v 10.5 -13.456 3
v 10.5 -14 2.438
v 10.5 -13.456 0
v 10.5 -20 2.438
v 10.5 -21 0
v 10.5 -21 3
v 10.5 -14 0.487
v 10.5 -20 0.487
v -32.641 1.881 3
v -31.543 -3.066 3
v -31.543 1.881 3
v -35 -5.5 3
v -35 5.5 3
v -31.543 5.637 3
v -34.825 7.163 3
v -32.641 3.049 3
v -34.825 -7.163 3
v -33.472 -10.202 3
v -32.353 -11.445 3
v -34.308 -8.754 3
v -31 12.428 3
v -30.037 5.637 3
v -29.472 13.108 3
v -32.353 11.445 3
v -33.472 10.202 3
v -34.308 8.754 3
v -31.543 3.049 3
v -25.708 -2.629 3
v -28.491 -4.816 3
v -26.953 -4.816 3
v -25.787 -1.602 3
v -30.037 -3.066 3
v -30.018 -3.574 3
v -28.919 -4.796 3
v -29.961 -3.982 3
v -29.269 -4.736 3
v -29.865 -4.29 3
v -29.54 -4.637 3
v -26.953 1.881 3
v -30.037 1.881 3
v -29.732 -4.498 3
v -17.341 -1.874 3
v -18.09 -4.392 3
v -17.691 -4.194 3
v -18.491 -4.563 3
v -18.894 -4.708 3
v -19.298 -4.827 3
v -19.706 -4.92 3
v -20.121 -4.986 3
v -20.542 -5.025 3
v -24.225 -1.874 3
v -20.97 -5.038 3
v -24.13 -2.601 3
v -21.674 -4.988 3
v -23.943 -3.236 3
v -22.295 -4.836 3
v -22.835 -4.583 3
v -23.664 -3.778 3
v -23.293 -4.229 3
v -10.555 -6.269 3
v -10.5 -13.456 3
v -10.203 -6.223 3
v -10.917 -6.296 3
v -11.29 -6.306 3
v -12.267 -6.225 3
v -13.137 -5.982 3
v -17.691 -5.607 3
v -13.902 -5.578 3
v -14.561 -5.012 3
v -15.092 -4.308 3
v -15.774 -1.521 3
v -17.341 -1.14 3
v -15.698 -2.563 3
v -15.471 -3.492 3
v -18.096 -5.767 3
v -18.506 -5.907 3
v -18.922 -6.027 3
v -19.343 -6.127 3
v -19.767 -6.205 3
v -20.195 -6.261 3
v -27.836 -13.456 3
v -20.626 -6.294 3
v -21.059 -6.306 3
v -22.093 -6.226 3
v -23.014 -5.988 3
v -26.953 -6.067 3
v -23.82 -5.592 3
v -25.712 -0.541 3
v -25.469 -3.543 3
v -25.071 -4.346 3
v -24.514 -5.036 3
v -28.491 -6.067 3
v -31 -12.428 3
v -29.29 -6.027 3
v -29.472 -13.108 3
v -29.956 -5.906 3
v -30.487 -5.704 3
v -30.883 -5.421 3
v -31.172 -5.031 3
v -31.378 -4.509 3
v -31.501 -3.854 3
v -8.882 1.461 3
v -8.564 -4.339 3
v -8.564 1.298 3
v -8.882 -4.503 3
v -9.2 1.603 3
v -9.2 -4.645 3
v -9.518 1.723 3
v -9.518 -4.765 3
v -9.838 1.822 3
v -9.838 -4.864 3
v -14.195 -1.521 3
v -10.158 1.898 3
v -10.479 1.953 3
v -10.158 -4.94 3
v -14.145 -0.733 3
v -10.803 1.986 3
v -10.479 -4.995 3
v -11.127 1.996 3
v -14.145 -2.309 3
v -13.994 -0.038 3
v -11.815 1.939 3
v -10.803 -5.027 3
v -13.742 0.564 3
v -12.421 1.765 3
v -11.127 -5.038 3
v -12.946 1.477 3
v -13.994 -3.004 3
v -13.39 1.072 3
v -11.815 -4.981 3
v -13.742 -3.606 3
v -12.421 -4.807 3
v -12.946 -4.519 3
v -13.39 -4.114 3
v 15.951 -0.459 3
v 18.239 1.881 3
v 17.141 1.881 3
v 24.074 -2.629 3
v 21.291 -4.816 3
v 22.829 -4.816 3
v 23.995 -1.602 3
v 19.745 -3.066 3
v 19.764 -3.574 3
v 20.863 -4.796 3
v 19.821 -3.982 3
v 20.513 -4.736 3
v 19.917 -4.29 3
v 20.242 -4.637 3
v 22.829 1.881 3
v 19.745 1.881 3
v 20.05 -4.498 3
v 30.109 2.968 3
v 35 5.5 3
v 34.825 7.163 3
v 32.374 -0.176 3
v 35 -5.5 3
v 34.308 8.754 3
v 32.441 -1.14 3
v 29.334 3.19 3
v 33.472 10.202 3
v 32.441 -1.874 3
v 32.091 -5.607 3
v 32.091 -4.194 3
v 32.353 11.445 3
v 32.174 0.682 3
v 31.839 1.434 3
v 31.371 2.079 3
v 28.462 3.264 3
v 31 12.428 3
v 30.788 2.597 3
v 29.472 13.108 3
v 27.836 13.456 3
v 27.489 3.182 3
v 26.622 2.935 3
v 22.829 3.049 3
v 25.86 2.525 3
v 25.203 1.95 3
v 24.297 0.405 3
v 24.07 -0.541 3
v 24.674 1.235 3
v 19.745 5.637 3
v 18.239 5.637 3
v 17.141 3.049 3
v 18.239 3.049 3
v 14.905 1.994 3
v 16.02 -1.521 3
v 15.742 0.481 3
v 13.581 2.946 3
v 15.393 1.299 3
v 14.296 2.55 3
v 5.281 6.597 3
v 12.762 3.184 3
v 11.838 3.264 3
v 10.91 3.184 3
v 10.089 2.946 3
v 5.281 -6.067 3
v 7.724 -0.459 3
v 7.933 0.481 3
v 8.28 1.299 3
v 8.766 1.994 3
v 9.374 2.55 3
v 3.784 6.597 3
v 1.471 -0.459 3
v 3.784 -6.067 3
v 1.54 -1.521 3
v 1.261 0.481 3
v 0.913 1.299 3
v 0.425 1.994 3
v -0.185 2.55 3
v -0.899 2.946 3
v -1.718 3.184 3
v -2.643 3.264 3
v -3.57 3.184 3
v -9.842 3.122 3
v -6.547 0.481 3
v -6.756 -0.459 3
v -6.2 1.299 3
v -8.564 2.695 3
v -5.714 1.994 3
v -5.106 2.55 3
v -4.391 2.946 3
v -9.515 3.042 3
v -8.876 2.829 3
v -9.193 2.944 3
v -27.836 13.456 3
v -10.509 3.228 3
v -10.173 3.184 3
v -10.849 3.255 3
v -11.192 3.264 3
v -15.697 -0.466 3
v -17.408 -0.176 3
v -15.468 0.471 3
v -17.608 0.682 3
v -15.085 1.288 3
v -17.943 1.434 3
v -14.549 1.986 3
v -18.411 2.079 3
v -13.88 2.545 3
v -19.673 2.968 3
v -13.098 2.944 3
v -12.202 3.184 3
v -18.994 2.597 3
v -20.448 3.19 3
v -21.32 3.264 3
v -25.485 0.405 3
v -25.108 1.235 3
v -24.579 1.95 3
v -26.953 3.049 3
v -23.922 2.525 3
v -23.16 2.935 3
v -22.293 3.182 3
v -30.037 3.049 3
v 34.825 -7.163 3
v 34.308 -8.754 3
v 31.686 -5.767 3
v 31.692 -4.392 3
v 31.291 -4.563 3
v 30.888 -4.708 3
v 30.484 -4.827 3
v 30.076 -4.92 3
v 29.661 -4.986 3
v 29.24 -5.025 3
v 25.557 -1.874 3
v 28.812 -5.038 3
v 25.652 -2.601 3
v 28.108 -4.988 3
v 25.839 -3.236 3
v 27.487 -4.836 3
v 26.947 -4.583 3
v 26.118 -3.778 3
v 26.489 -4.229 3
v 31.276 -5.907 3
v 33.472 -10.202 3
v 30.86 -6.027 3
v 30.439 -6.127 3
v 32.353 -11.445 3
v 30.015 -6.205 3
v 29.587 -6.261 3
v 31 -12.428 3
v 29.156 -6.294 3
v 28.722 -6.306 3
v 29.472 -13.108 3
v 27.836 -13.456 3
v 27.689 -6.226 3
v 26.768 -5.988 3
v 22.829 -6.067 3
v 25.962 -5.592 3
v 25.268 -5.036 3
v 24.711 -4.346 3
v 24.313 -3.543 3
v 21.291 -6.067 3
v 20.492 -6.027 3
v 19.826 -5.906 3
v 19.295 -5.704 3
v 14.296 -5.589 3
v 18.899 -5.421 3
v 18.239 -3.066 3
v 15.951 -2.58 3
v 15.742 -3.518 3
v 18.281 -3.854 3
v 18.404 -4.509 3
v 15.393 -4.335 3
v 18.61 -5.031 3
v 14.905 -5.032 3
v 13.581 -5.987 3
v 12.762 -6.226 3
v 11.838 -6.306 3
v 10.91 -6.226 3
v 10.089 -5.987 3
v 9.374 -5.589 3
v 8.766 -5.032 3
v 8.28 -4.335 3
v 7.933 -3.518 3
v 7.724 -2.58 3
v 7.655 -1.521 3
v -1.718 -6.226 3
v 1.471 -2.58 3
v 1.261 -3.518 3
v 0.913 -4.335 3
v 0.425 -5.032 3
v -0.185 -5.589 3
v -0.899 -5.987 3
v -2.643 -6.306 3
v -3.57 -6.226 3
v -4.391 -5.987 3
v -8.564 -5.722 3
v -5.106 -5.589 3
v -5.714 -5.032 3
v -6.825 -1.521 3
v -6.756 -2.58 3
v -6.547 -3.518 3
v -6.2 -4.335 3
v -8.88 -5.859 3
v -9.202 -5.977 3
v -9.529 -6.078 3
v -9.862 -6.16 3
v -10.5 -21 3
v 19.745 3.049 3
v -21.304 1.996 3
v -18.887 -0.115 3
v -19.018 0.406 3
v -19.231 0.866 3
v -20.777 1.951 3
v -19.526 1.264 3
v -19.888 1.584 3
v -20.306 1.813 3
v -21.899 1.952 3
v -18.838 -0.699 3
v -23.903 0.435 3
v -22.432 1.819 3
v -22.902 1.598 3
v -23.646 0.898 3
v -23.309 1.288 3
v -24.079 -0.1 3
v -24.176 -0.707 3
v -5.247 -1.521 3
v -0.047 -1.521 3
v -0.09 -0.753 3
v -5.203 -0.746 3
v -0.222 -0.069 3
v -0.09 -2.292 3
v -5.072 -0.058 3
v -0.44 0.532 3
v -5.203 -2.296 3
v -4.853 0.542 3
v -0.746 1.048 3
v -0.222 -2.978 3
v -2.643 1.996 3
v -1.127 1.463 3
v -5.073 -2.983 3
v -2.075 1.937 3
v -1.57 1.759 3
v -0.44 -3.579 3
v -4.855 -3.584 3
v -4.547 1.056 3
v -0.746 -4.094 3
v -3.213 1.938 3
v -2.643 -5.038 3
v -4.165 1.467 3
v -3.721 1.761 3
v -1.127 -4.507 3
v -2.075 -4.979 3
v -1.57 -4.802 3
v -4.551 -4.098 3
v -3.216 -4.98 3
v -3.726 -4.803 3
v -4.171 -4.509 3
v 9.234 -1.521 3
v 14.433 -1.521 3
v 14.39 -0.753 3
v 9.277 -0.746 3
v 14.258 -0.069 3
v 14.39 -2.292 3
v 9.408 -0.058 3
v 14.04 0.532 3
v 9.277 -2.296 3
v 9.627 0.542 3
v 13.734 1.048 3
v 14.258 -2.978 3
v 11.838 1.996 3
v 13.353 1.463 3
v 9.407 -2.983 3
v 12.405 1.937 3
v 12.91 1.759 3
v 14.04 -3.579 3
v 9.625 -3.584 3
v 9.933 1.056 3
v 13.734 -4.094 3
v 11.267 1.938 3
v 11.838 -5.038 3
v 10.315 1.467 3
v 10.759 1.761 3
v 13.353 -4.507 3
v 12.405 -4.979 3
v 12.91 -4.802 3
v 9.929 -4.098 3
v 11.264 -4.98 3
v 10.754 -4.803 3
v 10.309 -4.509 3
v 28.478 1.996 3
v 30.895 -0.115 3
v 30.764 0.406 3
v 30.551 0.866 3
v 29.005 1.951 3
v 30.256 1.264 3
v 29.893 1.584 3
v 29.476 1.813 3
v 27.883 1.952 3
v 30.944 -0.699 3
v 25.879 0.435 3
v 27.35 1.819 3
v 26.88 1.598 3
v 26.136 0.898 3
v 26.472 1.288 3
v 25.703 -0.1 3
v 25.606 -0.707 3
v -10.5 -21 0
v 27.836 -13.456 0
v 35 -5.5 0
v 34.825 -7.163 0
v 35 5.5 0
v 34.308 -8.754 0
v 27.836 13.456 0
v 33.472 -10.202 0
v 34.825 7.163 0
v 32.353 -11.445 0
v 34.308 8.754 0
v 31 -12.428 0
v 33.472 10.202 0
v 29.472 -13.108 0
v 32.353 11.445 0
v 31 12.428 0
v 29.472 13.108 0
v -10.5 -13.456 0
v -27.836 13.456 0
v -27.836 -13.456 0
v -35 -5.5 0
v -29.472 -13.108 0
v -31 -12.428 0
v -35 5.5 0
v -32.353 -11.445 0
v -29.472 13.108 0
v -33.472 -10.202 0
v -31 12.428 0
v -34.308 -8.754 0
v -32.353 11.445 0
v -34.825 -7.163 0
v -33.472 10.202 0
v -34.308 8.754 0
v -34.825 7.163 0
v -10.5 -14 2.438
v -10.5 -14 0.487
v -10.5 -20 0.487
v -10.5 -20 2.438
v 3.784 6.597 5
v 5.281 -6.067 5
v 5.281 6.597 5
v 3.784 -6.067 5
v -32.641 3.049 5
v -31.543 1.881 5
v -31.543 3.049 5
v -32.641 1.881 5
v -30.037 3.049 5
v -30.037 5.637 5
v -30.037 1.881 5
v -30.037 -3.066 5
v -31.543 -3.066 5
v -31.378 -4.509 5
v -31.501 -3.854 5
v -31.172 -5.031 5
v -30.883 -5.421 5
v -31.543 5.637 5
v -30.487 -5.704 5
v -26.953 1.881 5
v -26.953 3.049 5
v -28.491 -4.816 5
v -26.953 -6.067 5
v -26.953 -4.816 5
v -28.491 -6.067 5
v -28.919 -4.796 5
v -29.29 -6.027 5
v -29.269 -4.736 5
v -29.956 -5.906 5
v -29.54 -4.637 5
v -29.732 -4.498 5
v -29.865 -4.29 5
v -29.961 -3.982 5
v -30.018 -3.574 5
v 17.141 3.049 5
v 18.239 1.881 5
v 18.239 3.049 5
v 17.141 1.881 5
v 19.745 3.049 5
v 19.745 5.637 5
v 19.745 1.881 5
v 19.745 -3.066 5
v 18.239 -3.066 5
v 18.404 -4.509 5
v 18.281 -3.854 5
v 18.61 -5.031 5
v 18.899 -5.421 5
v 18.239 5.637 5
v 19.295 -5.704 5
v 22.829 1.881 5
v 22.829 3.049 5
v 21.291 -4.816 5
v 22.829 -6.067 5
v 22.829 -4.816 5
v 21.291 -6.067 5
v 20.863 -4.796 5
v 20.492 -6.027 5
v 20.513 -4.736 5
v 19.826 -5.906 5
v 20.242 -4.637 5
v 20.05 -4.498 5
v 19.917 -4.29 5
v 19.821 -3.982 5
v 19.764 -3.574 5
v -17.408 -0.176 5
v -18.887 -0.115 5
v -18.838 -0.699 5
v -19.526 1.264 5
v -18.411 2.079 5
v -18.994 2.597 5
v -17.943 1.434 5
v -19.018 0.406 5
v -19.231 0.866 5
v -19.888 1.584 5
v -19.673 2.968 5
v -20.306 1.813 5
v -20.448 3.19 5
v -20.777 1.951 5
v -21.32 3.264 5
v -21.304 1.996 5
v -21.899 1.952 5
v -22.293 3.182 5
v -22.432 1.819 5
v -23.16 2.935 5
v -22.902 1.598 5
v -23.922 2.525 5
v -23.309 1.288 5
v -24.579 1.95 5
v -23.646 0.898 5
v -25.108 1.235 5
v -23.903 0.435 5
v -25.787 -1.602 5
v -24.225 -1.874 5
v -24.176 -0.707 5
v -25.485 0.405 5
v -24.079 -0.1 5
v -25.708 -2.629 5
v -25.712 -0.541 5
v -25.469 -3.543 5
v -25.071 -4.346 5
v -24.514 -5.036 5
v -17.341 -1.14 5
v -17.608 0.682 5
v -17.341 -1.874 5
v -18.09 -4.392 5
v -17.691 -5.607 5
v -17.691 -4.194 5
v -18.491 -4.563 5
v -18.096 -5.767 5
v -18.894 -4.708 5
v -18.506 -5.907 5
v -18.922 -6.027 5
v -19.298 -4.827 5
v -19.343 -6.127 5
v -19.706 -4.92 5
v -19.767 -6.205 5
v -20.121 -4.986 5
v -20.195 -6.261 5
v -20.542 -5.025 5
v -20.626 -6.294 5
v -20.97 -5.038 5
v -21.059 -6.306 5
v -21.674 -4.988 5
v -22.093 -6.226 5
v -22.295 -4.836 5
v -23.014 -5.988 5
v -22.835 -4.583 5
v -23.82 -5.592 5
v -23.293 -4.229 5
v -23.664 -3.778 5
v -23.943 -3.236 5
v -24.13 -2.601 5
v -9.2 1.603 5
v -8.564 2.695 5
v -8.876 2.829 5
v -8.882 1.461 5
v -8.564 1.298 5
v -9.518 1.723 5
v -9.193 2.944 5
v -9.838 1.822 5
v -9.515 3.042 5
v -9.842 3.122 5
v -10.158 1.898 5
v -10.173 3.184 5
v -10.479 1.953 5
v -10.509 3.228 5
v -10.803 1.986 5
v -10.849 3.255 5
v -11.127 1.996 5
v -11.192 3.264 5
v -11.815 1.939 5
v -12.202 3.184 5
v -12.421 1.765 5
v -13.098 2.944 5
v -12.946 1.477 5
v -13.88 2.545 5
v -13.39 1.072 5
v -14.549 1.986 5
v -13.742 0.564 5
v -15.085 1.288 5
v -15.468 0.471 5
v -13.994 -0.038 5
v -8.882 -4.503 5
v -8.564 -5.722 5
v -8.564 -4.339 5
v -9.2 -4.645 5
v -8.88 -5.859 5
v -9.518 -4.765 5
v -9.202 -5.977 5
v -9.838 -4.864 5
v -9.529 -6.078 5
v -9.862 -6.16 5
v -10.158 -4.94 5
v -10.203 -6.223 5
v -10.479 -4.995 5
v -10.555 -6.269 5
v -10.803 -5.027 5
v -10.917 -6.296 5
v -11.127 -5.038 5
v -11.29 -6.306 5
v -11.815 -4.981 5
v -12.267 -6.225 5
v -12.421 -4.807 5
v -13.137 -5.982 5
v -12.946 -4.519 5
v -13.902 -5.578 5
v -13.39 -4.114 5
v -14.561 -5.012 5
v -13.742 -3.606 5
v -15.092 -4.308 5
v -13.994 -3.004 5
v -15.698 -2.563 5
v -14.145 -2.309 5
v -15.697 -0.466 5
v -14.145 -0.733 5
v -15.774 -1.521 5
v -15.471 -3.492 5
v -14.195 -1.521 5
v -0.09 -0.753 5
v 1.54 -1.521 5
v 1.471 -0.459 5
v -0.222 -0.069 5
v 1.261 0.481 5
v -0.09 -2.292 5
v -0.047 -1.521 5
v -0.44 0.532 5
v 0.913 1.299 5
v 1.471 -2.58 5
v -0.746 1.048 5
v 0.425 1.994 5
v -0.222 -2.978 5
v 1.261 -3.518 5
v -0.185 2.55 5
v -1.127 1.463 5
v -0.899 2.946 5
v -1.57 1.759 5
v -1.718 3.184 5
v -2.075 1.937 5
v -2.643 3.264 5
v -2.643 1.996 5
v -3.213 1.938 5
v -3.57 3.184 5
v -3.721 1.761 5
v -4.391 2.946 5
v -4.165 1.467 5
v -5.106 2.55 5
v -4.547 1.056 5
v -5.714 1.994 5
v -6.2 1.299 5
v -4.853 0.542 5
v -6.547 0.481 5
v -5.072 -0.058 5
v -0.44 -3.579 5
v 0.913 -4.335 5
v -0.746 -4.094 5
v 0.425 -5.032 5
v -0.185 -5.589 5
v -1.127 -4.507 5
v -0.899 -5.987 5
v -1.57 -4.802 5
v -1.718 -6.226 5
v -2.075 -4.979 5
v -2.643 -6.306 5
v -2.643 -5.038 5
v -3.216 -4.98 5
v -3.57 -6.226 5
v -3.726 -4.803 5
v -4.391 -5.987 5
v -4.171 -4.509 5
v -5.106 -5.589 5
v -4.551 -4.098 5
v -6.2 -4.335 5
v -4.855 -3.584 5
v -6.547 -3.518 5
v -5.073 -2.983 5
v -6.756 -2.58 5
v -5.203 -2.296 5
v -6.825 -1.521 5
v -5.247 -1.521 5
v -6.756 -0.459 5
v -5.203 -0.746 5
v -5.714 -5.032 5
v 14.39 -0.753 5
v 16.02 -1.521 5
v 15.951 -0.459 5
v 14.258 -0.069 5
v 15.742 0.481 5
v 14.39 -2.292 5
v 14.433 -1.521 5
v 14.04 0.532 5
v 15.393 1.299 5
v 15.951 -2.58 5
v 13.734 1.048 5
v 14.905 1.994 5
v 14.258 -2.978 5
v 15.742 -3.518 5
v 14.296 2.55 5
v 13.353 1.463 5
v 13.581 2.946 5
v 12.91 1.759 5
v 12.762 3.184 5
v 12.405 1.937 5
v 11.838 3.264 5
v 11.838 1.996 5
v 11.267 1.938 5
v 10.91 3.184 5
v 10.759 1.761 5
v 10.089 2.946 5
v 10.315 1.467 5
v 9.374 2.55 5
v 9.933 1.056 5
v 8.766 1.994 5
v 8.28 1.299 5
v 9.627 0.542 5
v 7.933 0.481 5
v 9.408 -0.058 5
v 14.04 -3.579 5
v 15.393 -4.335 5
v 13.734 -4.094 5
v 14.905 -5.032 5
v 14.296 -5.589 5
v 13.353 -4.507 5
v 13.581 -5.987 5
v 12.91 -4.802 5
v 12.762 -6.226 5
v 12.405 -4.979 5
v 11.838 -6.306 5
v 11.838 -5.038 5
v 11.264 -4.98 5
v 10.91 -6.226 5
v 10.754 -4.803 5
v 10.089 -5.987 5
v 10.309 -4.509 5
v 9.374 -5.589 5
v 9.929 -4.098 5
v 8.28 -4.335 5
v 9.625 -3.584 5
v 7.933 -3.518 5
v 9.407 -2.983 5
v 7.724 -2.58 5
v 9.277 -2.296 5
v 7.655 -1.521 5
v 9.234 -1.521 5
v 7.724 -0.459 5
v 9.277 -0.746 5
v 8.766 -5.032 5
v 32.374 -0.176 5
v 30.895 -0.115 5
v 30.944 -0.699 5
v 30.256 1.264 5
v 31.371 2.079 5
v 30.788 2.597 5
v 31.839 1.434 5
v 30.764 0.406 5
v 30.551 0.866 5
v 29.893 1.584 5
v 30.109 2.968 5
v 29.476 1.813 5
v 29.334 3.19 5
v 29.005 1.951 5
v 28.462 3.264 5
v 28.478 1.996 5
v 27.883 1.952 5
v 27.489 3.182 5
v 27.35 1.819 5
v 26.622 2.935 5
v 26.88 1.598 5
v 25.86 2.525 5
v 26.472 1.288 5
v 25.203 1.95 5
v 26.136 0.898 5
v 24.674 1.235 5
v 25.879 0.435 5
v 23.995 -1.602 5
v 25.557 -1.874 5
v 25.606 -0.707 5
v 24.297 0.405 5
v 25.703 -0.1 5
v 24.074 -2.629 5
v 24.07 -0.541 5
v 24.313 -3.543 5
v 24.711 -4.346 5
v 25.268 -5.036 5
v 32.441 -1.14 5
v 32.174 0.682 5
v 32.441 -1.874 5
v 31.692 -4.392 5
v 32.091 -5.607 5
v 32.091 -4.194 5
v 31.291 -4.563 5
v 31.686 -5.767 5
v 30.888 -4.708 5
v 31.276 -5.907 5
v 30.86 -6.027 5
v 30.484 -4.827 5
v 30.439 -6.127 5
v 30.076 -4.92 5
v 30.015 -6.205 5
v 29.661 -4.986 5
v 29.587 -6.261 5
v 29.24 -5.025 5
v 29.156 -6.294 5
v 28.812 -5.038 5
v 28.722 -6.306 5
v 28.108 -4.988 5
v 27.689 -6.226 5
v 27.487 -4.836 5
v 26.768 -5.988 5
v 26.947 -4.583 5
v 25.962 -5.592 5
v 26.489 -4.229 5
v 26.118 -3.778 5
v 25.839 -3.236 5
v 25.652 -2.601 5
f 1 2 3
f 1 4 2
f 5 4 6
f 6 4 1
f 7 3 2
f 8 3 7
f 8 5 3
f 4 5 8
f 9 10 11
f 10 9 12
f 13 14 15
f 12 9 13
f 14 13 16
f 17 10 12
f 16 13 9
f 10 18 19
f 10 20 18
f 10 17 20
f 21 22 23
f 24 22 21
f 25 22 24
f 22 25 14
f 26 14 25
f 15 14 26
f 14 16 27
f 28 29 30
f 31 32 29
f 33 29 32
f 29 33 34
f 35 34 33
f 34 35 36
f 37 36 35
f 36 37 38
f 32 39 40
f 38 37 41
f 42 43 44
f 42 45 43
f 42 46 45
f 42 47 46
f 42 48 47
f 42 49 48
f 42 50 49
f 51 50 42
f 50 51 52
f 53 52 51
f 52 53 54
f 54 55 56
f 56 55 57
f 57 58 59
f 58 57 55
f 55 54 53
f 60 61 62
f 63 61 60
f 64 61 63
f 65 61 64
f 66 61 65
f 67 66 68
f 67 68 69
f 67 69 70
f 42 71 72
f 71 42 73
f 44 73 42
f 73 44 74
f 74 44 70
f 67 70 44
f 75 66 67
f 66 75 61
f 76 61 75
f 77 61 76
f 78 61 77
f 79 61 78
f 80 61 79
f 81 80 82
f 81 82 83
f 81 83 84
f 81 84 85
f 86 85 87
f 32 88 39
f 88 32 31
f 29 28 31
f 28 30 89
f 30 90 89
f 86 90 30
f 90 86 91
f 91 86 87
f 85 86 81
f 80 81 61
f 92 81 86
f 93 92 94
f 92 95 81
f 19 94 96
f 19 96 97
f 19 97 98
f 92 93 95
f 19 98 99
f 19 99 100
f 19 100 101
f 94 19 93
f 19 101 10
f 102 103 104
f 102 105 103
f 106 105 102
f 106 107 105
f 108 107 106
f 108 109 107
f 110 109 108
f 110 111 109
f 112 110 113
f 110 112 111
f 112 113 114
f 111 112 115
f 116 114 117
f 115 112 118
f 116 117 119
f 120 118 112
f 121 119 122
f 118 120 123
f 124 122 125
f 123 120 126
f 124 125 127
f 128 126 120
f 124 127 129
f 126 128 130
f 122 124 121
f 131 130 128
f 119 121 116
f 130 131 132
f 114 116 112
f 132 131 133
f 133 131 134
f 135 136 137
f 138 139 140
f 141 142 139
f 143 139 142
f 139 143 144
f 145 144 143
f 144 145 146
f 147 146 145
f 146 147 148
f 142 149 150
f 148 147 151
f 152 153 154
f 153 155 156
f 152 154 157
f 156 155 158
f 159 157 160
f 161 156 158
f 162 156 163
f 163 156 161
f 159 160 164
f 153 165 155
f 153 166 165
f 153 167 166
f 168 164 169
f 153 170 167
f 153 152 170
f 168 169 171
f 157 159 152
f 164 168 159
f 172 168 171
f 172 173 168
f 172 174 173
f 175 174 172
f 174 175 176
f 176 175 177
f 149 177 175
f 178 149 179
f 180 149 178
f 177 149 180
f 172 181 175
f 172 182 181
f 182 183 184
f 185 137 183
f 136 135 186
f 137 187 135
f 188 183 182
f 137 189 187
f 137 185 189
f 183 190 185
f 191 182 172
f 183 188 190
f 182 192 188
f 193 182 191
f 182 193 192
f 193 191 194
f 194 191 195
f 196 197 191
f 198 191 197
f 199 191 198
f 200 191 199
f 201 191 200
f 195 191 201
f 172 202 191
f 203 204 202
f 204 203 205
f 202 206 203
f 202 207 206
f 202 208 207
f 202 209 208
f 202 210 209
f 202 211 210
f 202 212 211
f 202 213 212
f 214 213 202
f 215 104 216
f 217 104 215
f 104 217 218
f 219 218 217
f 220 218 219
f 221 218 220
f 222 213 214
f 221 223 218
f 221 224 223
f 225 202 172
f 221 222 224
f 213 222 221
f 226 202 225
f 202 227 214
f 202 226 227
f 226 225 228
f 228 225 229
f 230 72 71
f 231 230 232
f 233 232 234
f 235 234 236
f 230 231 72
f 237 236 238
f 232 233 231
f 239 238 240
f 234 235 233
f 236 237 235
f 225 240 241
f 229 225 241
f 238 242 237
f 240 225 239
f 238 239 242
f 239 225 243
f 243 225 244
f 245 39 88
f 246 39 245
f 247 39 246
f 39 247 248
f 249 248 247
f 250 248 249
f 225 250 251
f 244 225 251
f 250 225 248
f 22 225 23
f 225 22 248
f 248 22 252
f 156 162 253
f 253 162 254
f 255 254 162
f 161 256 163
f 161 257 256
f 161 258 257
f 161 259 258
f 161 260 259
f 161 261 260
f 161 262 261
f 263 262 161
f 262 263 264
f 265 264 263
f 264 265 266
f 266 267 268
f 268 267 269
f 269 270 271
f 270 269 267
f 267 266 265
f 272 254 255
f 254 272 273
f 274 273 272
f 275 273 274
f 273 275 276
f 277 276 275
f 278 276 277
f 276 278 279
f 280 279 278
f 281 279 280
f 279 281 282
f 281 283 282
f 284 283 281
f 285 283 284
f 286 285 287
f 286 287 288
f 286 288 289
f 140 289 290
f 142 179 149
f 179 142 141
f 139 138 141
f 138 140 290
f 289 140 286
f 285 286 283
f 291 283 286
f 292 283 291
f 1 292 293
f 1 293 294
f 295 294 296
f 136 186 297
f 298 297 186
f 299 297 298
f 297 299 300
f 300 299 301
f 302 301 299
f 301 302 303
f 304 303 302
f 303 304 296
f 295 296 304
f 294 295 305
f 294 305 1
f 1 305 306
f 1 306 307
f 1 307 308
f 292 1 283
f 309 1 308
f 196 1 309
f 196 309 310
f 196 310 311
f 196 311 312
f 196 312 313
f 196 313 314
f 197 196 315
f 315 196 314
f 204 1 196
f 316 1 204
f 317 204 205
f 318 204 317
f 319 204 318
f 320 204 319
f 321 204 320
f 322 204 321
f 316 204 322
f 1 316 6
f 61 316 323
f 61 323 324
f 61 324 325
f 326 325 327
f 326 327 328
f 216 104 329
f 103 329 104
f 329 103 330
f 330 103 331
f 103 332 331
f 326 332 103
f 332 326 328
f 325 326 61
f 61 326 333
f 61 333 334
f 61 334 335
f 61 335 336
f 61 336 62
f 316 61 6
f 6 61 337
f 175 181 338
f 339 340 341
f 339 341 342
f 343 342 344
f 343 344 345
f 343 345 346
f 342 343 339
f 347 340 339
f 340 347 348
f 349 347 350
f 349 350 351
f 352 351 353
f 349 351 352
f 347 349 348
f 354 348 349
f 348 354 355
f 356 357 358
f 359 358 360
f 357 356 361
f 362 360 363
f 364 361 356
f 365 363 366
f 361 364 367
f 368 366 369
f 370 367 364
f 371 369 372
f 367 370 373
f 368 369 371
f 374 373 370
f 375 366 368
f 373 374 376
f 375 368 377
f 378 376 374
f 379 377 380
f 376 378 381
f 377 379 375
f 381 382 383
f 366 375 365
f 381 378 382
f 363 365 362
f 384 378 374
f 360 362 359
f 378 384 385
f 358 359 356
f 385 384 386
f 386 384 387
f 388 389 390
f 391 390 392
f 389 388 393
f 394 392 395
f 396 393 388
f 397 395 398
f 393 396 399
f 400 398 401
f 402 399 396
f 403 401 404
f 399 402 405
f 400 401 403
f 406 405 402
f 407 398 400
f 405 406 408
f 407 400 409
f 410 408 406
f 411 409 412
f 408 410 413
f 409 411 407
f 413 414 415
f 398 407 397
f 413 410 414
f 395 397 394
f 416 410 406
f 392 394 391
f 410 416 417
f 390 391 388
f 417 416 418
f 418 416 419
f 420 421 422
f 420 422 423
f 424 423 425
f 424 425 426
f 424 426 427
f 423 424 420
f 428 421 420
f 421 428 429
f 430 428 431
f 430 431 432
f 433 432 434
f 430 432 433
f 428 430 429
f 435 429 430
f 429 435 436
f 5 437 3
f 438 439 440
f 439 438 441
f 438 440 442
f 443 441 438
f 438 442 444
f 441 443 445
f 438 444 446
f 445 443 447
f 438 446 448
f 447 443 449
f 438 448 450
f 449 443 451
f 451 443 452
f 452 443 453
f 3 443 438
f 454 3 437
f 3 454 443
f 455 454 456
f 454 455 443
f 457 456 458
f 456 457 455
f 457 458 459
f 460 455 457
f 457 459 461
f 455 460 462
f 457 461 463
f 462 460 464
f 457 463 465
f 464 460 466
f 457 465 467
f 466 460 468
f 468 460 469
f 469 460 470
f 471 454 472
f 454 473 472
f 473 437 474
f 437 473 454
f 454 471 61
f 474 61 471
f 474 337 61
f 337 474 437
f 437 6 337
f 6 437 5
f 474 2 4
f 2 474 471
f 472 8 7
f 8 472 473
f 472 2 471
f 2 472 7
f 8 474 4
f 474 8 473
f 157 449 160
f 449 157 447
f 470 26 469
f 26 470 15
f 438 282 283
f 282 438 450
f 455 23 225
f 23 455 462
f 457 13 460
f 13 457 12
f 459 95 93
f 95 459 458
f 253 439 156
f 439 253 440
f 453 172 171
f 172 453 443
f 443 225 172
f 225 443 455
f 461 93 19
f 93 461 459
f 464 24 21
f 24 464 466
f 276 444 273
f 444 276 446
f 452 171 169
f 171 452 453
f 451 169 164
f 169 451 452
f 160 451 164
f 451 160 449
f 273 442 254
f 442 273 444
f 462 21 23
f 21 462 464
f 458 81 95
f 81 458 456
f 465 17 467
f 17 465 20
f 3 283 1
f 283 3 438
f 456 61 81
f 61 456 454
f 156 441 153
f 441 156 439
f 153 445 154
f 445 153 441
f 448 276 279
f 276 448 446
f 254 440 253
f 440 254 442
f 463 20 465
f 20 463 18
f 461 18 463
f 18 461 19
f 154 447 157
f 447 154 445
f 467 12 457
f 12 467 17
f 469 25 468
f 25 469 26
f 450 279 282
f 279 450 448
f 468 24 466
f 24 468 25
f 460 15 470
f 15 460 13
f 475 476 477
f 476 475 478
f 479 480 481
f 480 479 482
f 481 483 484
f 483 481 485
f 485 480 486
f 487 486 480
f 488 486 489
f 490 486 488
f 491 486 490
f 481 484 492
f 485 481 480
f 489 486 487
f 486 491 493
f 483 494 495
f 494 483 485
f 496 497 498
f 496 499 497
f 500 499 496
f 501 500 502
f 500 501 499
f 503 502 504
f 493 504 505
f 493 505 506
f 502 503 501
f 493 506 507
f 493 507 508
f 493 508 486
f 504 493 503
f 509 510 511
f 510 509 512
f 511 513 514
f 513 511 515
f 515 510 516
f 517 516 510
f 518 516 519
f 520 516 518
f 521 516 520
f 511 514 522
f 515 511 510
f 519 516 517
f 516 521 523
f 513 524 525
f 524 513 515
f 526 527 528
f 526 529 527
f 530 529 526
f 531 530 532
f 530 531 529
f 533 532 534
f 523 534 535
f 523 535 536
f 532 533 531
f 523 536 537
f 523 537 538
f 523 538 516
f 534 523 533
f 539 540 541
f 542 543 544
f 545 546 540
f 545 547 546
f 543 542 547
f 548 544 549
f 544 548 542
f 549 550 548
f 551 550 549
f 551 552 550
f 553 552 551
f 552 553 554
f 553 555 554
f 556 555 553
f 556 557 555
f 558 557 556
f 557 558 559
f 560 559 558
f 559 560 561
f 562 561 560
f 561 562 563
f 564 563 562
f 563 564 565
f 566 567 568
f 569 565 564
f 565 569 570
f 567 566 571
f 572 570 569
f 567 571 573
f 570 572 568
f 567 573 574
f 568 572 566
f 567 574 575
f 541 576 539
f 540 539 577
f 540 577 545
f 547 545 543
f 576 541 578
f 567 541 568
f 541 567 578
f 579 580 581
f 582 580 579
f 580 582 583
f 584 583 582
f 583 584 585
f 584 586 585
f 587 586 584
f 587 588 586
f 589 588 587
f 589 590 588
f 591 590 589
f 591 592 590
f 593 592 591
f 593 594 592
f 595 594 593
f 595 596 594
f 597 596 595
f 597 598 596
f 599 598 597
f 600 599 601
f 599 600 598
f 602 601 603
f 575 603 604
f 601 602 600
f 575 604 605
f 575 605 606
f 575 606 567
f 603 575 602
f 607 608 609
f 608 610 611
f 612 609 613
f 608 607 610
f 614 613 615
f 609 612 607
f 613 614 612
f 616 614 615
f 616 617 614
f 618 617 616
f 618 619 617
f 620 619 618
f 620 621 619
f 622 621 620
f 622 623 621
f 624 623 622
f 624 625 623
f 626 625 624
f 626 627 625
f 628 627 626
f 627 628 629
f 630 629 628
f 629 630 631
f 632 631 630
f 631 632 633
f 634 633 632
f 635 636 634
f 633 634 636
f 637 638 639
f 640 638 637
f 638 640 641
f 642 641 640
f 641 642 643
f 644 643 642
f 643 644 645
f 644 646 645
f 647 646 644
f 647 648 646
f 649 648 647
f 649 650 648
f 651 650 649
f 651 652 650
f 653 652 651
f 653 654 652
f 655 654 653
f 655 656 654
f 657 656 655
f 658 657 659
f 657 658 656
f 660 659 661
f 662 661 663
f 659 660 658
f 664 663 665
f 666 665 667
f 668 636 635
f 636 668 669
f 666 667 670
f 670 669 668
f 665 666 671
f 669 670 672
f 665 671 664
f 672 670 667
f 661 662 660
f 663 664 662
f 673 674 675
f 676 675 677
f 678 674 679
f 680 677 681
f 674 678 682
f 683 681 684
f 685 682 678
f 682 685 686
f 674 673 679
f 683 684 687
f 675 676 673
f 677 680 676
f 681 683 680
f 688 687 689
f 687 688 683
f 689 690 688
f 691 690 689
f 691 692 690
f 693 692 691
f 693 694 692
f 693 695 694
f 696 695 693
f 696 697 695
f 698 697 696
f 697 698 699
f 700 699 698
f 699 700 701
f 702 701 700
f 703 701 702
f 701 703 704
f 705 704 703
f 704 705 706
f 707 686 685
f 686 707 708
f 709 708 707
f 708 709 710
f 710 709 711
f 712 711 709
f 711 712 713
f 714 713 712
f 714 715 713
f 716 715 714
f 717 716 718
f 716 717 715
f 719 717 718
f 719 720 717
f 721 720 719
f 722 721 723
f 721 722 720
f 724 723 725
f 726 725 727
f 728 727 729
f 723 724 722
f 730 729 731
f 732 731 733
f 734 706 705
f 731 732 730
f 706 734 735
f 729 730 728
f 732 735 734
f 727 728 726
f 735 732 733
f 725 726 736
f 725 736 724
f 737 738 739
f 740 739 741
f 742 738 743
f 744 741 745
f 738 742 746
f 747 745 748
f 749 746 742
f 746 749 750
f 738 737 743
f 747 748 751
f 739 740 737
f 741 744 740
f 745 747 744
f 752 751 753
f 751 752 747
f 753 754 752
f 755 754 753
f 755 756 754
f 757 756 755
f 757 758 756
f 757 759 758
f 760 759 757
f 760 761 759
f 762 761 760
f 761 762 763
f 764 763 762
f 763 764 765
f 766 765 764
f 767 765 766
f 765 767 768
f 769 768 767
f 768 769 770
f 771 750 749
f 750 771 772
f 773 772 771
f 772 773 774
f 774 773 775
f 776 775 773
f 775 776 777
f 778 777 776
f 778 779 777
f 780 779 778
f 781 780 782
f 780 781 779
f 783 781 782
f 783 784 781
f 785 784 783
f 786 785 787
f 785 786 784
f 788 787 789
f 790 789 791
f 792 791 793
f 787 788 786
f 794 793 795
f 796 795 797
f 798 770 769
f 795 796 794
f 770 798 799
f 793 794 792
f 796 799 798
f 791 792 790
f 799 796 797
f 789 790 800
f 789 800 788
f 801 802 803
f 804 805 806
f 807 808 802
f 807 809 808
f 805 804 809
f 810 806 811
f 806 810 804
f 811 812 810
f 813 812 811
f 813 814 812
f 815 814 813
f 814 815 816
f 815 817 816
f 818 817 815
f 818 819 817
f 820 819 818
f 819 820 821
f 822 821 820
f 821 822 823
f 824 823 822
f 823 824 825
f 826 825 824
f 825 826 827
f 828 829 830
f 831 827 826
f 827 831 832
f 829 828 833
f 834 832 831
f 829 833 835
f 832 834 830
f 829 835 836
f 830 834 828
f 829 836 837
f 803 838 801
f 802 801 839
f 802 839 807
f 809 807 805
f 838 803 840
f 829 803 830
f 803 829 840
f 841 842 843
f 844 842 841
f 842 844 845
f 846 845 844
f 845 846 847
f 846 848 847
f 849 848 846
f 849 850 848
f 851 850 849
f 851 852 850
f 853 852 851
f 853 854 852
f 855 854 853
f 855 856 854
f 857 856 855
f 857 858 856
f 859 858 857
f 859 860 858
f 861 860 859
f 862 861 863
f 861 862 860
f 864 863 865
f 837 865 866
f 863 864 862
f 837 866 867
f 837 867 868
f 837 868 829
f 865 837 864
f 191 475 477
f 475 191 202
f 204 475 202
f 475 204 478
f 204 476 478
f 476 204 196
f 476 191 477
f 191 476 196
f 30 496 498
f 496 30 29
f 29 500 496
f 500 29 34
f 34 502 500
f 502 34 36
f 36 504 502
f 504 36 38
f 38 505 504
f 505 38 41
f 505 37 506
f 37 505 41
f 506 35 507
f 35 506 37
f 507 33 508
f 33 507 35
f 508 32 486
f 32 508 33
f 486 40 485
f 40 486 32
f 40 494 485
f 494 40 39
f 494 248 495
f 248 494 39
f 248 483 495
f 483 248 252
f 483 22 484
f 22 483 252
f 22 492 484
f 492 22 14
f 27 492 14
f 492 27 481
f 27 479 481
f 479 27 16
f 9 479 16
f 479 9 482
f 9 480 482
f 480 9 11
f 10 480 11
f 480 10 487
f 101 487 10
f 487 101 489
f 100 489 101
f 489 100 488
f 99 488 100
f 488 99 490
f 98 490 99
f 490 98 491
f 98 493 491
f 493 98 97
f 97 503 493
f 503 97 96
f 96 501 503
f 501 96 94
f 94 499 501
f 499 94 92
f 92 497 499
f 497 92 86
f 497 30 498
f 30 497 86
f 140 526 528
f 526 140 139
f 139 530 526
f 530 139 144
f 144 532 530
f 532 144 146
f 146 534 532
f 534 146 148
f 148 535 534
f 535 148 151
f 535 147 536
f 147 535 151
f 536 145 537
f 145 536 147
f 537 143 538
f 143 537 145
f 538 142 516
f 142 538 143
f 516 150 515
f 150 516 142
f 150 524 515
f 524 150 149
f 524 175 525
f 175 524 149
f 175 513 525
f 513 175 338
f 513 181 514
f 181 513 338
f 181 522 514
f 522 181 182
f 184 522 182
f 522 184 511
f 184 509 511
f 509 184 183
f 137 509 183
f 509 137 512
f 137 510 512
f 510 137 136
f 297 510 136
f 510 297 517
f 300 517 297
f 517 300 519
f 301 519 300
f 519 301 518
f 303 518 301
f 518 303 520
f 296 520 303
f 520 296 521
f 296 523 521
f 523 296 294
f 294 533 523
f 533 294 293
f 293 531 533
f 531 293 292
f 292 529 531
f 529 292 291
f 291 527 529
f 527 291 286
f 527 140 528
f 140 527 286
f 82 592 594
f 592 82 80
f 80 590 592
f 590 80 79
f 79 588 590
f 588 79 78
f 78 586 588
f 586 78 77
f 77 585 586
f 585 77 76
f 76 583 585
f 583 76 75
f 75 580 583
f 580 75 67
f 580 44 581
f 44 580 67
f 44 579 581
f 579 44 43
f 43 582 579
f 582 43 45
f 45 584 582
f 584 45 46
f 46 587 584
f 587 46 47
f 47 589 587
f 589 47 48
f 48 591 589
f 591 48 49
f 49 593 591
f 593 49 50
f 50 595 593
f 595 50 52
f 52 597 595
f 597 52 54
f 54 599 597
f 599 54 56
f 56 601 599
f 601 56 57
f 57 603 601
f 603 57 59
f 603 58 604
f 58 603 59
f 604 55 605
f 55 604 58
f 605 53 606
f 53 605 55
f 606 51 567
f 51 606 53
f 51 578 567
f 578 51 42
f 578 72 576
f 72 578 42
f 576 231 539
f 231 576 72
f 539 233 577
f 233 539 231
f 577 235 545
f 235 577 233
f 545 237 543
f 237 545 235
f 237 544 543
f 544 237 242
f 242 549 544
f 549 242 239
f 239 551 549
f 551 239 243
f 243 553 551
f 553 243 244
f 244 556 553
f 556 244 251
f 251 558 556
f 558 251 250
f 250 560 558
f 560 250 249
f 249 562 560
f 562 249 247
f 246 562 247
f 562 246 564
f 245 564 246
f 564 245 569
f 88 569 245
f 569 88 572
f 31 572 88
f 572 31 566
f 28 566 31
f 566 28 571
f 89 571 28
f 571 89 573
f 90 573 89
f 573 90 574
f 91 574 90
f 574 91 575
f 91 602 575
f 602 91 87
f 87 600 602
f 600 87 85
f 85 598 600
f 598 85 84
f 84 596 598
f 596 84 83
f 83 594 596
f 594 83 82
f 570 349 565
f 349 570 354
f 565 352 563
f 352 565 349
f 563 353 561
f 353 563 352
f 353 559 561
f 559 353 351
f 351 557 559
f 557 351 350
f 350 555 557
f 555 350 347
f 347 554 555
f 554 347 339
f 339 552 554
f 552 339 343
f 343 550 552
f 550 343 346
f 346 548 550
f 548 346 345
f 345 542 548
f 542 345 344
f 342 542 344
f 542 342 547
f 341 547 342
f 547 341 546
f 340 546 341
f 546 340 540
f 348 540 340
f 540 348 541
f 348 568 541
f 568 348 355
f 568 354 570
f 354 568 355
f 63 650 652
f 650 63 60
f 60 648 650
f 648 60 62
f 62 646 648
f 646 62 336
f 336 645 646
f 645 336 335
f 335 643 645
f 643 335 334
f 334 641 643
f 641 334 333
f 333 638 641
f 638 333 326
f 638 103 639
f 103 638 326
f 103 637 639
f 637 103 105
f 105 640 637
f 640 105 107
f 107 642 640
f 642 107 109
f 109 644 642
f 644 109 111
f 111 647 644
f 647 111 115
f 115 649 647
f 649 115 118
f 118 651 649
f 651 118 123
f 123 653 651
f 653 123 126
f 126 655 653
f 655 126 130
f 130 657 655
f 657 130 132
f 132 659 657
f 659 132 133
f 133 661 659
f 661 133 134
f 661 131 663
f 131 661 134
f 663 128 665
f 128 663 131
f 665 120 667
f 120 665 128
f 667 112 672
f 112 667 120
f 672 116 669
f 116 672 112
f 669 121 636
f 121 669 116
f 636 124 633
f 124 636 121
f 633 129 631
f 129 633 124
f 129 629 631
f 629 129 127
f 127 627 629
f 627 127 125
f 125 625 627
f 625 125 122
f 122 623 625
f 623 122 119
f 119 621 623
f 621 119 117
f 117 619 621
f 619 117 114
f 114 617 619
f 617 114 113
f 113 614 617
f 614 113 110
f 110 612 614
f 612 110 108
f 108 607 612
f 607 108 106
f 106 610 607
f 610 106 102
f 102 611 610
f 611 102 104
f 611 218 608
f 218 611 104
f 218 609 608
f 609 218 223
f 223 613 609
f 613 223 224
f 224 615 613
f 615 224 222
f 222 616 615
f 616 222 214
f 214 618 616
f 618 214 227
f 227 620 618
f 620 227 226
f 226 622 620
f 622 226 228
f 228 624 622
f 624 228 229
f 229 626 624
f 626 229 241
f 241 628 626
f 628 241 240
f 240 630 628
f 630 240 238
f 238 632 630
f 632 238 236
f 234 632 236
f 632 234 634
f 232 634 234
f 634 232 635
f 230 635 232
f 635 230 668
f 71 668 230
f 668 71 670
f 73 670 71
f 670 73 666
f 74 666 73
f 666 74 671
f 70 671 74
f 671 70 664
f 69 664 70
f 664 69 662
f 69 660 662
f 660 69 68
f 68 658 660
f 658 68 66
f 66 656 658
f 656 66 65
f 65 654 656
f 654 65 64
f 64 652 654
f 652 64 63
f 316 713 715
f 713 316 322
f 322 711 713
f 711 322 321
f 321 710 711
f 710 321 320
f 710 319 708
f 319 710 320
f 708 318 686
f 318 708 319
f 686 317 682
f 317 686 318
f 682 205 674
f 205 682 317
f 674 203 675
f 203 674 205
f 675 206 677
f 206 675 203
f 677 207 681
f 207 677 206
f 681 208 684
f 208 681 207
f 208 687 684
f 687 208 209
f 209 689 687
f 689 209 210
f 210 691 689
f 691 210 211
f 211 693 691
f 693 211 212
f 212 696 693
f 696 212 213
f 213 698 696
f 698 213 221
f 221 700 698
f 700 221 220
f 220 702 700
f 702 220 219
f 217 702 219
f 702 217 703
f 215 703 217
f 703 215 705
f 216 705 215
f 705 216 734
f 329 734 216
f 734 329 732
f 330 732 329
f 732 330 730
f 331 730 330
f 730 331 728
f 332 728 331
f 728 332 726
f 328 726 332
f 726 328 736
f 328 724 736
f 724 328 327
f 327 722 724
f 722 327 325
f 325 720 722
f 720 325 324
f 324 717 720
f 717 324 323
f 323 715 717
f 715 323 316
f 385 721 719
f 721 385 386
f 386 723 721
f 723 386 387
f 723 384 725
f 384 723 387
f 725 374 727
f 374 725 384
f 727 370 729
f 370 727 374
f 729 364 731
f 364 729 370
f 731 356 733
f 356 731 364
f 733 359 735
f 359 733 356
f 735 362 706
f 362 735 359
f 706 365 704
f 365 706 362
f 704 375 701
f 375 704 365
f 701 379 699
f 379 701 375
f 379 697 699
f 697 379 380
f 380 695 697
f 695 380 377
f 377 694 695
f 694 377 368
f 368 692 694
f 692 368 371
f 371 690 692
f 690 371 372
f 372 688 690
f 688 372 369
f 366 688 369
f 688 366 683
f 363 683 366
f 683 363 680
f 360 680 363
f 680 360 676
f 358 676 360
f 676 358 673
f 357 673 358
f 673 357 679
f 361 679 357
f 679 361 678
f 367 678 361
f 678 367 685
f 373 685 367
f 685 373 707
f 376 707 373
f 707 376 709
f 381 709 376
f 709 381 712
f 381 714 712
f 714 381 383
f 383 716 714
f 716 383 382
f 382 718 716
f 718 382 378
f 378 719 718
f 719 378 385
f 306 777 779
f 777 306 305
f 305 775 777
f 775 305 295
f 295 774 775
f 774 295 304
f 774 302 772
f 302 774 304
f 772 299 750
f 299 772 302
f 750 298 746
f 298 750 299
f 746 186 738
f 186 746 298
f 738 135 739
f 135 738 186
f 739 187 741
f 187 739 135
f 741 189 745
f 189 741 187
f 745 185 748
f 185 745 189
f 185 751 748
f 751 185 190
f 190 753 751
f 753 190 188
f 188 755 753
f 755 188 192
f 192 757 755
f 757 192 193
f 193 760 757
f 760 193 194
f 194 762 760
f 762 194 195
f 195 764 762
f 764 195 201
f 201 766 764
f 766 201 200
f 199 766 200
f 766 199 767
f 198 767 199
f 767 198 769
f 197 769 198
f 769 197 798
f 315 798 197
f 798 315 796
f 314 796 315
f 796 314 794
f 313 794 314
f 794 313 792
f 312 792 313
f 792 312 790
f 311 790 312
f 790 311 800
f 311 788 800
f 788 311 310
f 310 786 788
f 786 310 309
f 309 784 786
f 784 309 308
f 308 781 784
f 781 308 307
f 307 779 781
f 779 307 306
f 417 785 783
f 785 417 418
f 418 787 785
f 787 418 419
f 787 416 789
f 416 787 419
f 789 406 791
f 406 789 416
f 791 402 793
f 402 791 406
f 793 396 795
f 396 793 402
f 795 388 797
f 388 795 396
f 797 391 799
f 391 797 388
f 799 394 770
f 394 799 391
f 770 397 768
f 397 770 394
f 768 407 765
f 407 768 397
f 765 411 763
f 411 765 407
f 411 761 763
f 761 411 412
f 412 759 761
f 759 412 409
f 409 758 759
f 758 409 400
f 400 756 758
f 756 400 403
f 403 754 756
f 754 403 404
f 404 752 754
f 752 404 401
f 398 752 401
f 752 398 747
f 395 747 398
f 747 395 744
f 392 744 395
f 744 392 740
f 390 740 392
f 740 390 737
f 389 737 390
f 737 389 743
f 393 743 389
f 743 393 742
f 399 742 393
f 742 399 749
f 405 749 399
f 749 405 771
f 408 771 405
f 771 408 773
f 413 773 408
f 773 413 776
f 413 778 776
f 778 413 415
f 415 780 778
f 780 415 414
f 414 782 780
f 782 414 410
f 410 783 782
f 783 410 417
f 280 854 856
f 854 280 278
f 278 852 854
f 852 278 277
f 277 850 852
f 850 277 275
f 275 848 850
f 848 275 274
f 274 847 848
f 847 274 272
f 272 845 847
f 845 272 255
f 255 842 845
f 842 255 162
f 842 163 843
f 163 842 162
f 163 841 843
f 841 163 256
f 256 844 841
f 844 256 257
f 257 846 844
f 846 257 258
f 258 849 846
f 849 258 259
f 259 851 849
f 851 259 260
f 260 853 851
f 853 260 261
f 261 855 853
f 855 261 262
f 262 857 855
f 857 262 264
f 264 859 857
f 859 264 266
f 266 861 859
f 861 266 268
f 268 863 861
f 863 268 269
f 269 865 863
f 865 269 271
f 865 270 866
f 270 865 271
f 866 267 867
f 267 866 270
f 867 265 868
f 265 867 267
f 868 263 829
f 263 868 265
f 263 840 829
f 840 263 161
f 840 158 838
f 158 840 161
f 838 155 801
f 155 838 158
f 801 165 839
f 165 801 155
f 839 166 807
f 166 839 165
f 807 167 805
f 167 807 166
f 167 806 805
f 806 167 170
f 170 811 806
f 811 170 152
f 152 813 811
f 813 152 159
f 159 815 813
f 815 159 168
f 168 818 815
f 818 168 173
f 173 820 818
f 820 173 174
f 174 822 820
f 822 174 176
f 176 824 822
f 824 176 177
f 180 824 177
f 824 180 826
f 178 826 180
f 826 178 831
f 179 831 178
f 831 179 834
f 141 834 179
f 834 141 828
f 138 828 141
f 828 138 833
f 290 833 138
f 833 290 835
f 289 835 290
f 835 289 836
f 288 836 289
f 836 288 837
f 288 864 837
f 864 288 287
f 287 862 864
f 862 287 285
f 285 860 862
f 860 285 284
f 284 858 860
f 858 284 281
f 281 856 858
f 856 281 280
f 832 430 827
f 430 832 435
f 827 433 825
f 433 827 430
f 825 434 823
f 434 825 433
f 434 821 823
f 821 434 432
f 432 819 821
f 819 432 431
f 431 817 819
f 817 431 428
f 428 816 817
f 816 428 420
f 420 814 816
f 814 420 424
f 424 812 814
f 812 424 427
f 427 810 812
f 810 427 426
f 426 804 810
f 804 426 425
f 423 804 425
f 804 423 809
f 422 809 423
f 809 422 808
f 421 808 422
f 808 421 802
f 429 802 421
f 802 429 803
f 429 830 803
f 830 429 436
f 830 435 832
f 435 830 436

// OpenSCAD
include <../../name-tag.scad>
        
font="../../write/orbitron.dxf";

nametag(font=font,
        xIconOffset = 40,
        yIconOffset = 5,
        leftIconType = "-none-",
        leftIconHeight = 4,
        rightIconType = "-none-",
        rightIconHeight = 4,
        rightIconXyScale = 1,
        topText = "tecolote",
        topTextSize = 12,
        bottomText = "",
        baseWidth = 58,
        baseHeight = 15,
        roundedCorners = true,
        chainLoop = true,
        chainLoopPosition = "bottom");
